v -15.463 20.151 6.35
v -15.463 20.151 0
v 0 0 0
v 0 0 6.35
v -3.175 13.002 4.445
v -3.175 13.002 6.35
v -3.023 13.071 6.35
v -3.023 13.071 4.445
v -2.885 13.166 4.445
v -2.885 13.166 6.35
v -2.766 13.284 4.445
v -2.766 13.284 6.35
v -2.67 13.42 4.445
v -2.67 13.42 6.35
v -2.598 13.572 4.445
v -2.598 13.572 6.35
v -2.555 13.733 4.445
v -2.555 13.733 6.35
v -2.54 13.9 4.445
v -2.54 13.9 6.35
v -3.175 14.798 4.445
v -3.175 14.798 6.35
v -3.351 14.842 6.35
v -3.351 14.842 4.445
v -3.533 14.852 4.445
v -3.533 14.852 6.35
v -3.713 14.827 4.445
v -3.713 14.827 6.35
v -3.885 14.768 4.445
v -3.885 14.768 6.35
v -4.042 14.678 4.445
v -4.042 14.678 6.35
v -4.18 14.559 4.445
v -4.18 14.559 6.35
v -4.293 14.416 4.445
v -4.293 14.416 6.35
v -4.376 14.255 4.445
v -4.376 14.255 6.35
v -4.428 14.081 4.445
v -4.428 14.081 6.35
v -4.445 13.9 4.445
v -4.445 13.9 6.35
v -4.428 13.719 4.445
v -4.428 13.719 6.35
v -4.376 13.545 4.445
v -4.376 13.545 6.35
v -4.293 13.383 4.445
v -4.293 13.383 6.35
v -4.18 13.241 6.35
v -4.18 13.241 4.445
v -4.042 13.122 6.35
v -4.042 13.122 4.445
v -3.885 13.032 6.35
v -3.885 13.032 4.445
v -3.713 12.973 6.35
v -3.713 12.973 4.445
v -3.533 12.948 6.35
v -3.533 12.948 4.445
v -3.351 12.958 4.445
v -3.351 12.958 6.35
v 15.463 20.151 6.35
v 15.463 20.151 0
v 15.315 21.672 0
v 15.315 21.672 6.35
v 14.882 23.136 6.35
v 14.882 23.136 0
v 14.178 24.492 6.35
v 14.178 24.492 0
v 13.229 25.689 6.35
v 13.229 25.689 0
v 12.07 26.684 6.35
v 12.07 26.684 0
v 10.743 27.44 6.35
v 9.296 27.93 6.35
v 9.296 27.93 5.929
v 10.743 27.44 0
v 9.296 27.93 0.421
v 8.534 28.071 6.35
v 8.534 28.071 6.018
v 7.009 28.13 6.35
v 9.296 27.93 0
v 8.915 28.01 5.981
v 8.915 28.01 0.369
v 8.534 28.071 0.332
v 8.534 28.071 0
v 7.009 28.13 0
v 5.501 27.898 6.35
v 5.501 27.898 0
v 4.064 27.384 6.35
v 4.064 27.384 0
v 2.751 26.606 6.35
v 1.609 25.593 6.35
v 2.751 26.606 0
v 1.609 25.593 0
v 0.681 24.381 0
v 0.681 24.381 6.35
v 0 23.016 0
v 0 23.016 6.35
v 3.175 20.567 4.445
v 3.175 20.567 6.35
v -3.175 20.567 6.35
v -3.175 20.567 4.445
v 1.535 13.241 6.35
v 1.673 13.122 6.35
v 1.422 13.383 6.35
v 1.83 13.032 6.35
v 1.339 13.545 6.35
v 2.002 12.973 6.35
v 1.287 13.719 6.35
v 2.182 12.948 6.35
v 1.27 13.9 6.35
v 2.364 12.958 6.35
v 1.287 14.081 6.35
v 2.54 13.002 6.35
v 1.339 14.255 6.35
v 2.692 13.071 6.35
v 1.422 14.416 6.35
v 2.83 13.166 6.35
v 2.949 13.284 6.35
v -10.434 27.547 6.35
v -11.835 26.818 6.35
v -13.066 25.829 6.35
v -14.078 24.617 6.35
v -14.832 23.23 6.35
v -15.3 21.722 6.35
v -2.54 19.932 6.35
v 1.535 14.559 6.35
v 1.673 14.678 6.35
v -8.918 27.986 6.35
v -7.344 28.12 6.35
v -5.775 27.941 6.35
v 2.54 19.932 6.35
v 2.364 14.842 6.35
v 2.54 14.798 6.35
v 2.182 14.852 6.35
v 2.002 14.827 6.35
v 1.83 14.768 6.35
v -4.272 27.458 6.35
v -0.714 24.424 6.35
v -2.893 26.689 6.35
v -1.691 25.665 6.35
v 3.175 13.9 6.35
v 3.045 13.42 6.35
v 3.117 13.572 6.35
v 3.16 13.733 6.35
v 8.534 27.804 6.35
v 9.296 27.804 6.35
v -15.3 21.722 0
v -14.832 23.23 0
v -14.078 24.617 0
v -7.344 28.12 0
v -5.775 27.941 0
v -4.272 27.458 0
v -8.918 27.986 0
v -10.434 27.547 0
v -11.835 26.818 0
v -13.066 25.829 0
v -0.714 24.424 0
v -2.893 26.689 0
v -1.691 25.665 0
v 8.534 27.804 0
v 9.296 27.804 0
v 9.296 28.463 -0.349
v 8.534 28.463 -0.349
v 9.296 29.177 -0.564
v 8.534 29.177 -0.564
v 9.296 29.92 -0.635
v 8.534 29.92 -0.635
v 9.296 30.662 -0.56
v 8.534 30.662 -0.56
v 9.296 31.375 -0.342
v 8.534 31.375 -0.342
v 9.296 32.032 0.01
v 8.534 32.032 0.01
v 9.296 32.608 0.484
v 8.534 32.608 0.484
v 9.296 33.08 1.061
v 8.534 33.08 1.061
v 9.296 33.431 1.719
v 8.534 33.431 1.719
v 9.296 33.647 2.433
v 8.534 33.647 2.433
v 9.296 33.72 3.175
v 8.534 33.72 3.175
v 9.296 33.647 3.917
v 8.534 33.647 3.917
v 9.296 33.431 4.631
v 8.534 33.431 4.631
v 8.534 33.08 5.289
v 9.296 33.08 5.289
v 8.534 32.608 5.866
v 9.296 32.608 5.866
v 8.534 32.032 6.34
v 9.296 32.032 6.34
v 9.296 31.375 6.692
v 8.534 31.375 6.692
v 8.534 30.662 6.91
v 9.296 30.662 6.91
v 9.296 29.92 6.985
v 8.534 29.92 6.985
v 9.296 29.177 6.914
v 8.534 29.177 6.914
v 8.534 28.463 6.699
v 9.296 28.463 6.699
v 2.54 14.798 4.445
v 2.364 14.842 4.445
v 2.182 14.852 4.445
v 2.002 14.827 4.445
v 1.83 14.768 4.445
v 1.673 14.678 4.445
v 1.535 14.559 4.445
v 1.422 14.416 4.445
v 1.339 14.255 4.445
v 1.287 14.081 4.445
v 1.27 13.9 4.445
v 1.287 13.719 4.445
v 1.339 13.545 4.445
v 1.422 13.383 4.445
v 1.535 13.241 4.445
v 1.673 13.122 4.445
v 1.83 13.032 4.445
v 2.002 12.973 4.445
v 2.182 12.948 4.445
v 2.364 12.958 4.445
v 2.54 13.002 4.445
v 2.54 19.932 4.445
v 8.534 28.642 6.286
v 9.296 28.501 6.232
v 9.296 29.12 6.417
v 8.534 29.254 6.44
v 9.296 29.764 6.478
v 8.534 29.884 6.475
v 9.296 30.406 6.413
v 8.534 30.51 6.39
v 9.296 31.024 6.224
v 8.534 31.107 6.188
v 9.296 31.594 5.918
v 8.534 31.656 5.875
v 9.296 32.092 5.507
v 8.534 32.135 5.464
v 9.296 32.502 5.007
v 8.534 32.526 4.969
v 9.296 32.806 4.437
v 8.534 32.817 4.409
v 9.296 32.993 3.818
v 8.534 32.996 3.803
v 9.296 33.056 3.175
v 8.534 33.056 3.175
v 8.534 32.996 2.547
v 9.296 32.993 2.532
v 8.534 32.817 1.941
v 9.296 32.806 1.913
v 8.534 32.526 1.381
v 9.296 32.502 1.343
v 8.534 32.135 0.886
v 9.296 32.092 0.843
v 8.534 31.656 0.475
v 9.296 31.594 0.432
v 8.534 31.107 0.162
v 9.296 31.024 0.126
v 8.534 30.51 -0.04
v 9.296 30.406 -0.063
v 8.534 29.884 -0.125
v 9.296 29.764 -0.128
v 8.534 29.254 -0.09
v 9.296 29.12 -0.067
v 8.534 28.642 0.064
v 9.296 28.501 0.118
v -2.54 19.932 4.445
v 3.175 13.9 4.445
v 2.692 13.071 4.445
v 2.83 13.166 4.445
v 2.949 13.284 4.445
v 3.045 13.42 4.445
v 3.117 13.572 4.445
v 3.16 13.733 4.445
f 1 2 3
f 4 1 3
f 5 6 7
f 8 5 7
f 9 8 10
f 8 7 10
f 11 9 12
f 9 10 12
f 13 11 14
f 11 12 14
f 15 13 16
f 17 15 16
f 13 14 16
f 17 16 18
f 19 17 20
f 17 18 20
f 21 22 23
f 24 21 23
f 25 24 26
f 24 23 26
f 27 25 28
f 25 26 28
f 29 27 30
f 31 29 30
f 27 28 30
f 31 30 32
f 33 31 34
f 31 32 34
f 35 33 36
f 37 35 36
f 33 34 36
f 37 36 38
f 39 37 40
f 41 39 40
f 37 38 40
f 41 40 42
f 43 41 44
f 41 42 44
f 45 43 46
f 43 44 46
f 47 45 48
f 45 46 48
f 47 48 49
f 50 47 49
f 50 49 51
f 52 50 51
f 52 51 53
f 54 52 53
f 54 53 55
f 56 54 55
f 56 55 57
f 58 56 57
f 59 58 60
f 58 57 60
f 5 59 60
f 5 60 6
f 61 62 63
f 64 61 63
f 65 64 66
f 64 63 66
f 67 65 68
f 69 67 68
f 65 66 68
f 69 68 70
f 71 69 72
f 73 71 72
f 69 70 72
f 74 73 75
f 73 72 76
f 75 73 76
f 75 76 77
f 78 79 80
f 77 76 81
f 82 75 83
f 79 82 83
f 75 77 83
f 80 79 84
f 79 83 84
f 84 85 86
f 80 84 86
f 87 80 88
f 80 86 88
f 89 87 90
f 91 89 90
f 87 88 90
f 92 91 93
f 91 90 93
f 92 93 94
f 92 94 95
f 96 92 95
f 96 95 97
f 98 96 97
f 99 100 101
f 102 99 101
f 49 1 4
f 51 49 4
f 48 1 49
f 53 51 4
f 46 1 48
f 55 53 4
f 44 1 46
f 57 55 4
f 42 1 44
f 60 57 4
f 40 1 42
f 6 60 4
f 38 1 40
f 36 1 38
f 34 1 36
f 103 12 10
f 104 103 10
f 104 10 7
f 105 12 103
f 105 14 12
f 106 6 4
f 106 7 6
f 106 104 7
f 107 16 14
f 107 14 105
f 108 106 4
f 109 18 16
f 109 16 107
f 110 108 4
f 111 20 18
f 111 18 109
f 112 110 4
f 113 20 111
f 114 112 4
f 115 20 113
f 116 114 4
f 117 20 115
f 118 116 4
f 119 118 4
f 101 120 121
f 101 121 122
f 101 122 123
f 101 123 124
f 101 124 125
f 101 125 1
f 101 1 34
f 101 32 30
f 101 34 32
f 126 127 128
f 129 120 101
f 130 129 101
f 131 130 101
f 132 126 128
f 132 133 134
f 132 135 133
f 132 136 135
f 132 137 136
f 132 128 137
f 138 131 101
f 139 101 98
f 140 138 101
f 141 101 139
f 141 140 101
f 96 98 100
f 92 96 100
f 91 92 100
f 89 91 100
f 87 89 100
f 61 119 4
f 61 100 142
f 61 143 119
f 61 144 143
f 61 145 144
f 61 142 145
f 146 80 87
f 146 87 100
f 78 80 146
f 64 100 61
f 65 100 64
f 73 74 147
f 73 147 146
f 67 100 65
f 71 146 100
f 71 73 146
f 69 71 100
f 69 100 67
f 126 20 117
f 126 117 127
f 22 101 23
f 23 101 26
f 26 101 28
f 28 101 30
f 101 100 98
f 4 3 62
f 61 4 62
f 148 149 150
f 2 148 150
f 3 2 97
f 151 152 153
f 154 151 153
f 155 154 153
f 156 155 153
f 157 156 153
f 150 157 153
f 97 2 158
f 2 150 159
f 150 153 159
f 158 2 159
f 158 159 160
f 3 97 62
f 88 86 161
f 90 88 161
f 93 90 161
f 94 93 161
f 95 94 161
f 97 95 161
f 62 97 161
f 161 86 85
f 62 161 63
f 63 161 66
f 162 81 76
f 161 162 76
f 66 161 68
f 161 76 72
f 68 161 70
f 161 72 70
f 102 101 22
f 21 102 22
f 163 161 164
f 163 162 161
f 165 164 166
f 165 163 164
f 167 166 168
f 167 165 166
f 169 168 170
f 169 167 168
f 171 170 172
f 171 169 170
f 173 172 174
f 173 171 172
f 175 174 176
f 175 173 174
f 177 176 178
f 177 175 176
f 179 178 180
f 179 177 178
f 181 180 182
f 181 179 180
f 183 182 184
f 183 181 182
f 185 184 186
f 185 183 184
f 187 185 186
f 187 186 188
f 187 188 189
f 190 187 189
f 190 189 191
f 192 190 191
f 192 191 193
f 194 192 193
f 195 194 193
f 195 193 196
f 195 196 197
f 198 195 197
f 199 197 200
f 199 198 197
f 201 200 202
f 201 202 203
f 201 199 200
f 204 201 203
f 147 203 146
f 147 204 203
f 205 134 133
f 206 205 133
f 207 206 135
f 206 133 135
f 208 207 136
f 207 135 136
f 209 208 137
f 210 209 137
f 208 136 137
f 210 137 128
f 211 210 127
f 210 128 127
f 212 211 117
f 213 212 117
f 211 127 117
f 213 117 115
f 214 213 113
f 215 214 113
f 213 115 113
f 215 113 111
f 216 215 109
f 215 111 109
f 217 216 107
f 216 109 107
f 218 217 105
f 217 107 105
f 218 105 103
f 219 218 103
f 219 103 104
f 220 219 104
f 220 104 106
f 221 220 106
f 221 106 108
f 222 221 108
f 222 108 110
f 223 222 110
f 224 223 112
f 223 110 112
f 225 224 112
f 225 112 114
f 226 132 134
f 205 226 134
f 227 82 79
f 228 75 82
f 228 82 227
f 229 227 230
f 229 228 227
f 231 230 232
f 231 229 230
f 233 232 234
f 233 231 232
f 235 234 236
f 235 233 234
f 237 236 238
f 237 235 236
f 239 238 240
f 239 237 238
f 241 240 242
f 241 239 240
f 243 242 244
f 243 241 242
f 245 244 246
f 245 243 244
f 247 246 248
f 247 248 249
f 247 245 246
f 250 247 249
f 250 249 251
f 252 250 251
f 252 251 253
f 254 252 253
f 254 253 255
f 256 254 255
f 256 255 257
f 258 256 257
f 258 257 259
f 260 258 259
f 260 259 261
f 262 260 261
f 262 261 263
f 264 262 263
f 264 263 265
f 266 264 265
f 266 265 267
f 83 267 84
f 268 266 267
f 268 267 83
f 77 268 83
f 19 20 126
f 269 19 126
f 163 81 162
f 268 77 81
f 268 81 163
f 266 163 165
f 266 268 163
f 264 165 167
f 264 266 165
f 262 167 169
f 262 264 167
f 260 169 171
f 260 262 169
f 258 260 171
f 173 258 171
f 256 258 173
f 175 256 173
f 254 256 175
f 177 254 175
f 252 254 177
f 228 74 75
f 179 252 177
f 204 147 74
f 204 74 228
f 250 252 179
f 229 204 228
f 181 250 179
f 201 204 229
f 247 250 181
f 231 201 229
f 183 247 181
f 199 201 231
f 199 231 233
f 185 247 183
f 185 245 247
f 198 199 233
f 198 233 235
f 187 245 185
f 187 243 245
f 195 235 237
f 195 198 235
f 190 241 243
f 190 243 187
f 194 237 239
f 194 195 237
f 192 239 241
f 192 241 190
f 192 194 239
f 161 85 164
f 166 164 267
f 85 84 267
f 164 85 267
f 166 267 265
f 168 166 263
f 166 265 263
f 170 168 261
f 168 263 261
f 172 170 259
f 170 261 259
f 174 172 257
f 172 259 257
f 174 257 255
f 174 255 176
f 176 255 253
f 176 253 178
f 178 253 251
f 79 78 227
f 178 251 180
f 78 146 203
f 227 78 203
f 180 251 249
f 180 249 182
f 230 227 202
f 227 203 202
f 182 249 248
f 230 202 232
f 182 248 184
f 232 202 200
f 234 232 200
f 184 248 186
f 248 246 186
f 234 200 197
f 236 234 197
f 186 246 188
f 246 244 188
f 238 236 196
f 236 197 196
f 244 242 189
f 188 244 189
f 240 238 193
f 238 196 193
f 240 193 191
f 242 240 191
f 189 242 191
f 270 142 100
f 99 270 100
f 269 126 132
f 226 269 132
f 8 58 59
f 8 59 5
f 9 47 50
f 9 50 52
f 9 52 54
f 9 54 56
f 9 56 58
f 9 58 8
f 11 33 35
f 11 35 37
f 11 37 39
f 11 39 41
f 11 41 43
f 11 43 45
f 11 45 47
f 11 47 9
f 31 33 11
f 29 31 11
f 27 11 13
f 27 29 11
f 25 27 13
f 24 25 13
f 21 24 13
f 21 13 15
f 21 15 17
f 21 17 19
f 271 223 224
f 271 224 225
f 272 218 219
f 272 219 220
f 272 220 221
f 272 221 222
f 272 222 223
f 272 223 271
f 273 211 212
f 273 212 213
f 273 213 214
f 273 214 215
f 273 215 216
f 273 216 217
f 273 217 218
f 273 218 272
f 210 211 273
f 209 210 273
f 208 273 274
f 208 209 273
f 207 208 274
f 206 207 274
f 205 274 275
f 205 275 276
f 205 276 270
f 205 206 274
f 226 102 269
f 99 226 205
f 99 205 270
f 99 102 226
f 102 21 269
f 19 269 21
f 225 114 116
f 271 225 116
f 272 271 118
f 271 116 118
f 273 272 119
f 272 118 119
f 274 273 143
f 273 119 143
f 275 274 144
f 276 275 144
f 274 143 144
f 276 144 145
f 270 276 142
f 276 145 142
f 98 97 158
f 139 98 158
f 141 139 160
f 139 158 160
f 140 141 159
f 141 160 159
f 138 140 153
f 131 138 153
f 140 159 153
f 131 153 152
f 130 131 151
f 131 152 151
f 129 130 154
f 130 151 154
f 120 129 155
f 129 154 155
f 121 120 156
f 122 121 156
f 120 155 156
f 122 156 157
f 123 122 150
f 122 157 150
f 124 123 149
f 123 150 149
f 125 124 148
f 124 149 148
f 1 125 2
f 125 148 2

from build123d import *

# Parameters (mm, degrees)
F1_DEPTH = 6.35
F3_DEPTH = 1.905
F7_DEPTH = 0.381
F8_DEPTH = 0.381


with BuildPart() as f1:
    # F0 (on Top) → F1 (new body)
    with BuildSketch(Plane.XY):
        with BuildLine():
            Line((-15.4625402968, 20.1511748434), (0, 0))
            Line((0, 0), (15.4625402968, 20.1511748434))
            ThreePointArc((15.4625402968, 20.1511748434), (8.9216538352, 28.0088478457), (0, 23.0158213526))
            ThreePointArc((0, 23.0158213526), (-8.9175015723, 27.9864351215), (-15.4625402968, 20.1511748434))
        make_face()
    extrude(amount=F1_DEPTH)

    # F2 (on face) → F3 (cut)
    with BuildSketch(Plane.XY.offset(6.35)):
        with BuildLine():
            Line((2.54, 13.0019117156), (2.54, 14.7979629398))
            ThreePointArc((2.54, 14.7979629398), (1.27, 13.8999373277), (2.54, 13.0019117156))
        make_face()
        with BuildLine():
            ThreePointArc((2.54, 13.0019117156), (3.0002129933, 13.3500111963), (3.175, 13.8999373277))
            ThreePointArc((3.175, 13.8999373277), (3.0002129933, 14.4498634591), (2.54, 14.7979629398))
            Line((2.54, 14.7979629398), (2.54, 13.0019117156))
        make_face()
        with BuildLine():
            Line((3.175, 13.8999373277), (3.175, 19.9324373277))
            Line((3.175, 19.9324373277), (2.54, 19.9324373277))
            Line((2.54, 19.9324373277), (2.54, 14.7979629398))
            ThreePointArc((2.54, 14.7979629398), (3.0002129933, 14.4498634591), (3.175, 13.8999373277))
        make_face()
        Polygon((3.175, 20.5674373277), (-3.175, 20.5674373277), (-3.175, 19.9324373277), (-2.54, 19.9324373277), (2.54, 19.9324373277), (3.175, 19.9324373277), align=None)
        with BuildLine():
            Line((-2.54, 19.9324373277), (-3.175, 19.9324373277))
            Line((-3.175, 19.9324373277), (-3.175, 14.7979629398))
            ThreePointArc((-3.175, 14.7979629398), (-2.7147870067, 14.4498634591), (-2.54, 13.8999373277))
            Line((-2.54, 13.8999373277), (-2.54, 19.9324373277))
        make_face()
        with BuildLine():
            ThreePointArc((-2.54, 13.8999373277), (-2.7147870067, 14.4498634591), (-3.175, 14.7979629398))
            Line((-3.175, 14.7979629398), (-3.175, 13.0019117156))
            ThreePointArc((-3.175, 13.0019117156), (-2.7147870067, 13.3500111963), (-2.54, 13.8999373277))
        make_face()
        with BuildLine():
            Line((-3.175, 13.0019117156), (-3.175, 14.7979629398))
            ThreePointArc((-3.175, 14.7979629398), (-4.445, 13.8999373277), (-3.175, 13.0019117156))
        make_face()
    extrude(amount=-F3_DEPTH, mode=Mode.SUBTRACT)

    # F6 (on offset) → F7 (join)
    with BuildSketch(Plane.YZ.offset(8.9154)):
        with BuildLine():
            ThreePointArc((27.804363519, 0), (33.7204202608, 3.175), (27.804363519, 6.35))
            Line((27.804363519, 6.35), (27.804363519, 5.842))
            ThreePointArc((27.804363519, 5.842), (33.0560059571, 3.175), (27.804363519, 0.508))
            Line((27.804363519, 0.508), (27.804363519, 0))
        make_face()
    extrude(amount=F7_DEPTH)

    # F6 (on offset) → F8 (join)
    with BuildSketch(Plane.YZ.offset(8.9154)):
        with BuildLine():
            ThreePointArc((27.804363519, 0), (33.7204202608, 3.175), (27.804363519, 6.35))
            Line((27.804363519, 6.35), (27.804363519, 5.842))
            ThreePointArc((27.804363519, 5.842), (33.0560059571, 3.175), (27.804363519, 0.508))
            Line((27.804363519, 0.508), (27.804363519, 0))
        make_face()
    extrude(amount=-F8_DEPTH)


solid = f1.part
